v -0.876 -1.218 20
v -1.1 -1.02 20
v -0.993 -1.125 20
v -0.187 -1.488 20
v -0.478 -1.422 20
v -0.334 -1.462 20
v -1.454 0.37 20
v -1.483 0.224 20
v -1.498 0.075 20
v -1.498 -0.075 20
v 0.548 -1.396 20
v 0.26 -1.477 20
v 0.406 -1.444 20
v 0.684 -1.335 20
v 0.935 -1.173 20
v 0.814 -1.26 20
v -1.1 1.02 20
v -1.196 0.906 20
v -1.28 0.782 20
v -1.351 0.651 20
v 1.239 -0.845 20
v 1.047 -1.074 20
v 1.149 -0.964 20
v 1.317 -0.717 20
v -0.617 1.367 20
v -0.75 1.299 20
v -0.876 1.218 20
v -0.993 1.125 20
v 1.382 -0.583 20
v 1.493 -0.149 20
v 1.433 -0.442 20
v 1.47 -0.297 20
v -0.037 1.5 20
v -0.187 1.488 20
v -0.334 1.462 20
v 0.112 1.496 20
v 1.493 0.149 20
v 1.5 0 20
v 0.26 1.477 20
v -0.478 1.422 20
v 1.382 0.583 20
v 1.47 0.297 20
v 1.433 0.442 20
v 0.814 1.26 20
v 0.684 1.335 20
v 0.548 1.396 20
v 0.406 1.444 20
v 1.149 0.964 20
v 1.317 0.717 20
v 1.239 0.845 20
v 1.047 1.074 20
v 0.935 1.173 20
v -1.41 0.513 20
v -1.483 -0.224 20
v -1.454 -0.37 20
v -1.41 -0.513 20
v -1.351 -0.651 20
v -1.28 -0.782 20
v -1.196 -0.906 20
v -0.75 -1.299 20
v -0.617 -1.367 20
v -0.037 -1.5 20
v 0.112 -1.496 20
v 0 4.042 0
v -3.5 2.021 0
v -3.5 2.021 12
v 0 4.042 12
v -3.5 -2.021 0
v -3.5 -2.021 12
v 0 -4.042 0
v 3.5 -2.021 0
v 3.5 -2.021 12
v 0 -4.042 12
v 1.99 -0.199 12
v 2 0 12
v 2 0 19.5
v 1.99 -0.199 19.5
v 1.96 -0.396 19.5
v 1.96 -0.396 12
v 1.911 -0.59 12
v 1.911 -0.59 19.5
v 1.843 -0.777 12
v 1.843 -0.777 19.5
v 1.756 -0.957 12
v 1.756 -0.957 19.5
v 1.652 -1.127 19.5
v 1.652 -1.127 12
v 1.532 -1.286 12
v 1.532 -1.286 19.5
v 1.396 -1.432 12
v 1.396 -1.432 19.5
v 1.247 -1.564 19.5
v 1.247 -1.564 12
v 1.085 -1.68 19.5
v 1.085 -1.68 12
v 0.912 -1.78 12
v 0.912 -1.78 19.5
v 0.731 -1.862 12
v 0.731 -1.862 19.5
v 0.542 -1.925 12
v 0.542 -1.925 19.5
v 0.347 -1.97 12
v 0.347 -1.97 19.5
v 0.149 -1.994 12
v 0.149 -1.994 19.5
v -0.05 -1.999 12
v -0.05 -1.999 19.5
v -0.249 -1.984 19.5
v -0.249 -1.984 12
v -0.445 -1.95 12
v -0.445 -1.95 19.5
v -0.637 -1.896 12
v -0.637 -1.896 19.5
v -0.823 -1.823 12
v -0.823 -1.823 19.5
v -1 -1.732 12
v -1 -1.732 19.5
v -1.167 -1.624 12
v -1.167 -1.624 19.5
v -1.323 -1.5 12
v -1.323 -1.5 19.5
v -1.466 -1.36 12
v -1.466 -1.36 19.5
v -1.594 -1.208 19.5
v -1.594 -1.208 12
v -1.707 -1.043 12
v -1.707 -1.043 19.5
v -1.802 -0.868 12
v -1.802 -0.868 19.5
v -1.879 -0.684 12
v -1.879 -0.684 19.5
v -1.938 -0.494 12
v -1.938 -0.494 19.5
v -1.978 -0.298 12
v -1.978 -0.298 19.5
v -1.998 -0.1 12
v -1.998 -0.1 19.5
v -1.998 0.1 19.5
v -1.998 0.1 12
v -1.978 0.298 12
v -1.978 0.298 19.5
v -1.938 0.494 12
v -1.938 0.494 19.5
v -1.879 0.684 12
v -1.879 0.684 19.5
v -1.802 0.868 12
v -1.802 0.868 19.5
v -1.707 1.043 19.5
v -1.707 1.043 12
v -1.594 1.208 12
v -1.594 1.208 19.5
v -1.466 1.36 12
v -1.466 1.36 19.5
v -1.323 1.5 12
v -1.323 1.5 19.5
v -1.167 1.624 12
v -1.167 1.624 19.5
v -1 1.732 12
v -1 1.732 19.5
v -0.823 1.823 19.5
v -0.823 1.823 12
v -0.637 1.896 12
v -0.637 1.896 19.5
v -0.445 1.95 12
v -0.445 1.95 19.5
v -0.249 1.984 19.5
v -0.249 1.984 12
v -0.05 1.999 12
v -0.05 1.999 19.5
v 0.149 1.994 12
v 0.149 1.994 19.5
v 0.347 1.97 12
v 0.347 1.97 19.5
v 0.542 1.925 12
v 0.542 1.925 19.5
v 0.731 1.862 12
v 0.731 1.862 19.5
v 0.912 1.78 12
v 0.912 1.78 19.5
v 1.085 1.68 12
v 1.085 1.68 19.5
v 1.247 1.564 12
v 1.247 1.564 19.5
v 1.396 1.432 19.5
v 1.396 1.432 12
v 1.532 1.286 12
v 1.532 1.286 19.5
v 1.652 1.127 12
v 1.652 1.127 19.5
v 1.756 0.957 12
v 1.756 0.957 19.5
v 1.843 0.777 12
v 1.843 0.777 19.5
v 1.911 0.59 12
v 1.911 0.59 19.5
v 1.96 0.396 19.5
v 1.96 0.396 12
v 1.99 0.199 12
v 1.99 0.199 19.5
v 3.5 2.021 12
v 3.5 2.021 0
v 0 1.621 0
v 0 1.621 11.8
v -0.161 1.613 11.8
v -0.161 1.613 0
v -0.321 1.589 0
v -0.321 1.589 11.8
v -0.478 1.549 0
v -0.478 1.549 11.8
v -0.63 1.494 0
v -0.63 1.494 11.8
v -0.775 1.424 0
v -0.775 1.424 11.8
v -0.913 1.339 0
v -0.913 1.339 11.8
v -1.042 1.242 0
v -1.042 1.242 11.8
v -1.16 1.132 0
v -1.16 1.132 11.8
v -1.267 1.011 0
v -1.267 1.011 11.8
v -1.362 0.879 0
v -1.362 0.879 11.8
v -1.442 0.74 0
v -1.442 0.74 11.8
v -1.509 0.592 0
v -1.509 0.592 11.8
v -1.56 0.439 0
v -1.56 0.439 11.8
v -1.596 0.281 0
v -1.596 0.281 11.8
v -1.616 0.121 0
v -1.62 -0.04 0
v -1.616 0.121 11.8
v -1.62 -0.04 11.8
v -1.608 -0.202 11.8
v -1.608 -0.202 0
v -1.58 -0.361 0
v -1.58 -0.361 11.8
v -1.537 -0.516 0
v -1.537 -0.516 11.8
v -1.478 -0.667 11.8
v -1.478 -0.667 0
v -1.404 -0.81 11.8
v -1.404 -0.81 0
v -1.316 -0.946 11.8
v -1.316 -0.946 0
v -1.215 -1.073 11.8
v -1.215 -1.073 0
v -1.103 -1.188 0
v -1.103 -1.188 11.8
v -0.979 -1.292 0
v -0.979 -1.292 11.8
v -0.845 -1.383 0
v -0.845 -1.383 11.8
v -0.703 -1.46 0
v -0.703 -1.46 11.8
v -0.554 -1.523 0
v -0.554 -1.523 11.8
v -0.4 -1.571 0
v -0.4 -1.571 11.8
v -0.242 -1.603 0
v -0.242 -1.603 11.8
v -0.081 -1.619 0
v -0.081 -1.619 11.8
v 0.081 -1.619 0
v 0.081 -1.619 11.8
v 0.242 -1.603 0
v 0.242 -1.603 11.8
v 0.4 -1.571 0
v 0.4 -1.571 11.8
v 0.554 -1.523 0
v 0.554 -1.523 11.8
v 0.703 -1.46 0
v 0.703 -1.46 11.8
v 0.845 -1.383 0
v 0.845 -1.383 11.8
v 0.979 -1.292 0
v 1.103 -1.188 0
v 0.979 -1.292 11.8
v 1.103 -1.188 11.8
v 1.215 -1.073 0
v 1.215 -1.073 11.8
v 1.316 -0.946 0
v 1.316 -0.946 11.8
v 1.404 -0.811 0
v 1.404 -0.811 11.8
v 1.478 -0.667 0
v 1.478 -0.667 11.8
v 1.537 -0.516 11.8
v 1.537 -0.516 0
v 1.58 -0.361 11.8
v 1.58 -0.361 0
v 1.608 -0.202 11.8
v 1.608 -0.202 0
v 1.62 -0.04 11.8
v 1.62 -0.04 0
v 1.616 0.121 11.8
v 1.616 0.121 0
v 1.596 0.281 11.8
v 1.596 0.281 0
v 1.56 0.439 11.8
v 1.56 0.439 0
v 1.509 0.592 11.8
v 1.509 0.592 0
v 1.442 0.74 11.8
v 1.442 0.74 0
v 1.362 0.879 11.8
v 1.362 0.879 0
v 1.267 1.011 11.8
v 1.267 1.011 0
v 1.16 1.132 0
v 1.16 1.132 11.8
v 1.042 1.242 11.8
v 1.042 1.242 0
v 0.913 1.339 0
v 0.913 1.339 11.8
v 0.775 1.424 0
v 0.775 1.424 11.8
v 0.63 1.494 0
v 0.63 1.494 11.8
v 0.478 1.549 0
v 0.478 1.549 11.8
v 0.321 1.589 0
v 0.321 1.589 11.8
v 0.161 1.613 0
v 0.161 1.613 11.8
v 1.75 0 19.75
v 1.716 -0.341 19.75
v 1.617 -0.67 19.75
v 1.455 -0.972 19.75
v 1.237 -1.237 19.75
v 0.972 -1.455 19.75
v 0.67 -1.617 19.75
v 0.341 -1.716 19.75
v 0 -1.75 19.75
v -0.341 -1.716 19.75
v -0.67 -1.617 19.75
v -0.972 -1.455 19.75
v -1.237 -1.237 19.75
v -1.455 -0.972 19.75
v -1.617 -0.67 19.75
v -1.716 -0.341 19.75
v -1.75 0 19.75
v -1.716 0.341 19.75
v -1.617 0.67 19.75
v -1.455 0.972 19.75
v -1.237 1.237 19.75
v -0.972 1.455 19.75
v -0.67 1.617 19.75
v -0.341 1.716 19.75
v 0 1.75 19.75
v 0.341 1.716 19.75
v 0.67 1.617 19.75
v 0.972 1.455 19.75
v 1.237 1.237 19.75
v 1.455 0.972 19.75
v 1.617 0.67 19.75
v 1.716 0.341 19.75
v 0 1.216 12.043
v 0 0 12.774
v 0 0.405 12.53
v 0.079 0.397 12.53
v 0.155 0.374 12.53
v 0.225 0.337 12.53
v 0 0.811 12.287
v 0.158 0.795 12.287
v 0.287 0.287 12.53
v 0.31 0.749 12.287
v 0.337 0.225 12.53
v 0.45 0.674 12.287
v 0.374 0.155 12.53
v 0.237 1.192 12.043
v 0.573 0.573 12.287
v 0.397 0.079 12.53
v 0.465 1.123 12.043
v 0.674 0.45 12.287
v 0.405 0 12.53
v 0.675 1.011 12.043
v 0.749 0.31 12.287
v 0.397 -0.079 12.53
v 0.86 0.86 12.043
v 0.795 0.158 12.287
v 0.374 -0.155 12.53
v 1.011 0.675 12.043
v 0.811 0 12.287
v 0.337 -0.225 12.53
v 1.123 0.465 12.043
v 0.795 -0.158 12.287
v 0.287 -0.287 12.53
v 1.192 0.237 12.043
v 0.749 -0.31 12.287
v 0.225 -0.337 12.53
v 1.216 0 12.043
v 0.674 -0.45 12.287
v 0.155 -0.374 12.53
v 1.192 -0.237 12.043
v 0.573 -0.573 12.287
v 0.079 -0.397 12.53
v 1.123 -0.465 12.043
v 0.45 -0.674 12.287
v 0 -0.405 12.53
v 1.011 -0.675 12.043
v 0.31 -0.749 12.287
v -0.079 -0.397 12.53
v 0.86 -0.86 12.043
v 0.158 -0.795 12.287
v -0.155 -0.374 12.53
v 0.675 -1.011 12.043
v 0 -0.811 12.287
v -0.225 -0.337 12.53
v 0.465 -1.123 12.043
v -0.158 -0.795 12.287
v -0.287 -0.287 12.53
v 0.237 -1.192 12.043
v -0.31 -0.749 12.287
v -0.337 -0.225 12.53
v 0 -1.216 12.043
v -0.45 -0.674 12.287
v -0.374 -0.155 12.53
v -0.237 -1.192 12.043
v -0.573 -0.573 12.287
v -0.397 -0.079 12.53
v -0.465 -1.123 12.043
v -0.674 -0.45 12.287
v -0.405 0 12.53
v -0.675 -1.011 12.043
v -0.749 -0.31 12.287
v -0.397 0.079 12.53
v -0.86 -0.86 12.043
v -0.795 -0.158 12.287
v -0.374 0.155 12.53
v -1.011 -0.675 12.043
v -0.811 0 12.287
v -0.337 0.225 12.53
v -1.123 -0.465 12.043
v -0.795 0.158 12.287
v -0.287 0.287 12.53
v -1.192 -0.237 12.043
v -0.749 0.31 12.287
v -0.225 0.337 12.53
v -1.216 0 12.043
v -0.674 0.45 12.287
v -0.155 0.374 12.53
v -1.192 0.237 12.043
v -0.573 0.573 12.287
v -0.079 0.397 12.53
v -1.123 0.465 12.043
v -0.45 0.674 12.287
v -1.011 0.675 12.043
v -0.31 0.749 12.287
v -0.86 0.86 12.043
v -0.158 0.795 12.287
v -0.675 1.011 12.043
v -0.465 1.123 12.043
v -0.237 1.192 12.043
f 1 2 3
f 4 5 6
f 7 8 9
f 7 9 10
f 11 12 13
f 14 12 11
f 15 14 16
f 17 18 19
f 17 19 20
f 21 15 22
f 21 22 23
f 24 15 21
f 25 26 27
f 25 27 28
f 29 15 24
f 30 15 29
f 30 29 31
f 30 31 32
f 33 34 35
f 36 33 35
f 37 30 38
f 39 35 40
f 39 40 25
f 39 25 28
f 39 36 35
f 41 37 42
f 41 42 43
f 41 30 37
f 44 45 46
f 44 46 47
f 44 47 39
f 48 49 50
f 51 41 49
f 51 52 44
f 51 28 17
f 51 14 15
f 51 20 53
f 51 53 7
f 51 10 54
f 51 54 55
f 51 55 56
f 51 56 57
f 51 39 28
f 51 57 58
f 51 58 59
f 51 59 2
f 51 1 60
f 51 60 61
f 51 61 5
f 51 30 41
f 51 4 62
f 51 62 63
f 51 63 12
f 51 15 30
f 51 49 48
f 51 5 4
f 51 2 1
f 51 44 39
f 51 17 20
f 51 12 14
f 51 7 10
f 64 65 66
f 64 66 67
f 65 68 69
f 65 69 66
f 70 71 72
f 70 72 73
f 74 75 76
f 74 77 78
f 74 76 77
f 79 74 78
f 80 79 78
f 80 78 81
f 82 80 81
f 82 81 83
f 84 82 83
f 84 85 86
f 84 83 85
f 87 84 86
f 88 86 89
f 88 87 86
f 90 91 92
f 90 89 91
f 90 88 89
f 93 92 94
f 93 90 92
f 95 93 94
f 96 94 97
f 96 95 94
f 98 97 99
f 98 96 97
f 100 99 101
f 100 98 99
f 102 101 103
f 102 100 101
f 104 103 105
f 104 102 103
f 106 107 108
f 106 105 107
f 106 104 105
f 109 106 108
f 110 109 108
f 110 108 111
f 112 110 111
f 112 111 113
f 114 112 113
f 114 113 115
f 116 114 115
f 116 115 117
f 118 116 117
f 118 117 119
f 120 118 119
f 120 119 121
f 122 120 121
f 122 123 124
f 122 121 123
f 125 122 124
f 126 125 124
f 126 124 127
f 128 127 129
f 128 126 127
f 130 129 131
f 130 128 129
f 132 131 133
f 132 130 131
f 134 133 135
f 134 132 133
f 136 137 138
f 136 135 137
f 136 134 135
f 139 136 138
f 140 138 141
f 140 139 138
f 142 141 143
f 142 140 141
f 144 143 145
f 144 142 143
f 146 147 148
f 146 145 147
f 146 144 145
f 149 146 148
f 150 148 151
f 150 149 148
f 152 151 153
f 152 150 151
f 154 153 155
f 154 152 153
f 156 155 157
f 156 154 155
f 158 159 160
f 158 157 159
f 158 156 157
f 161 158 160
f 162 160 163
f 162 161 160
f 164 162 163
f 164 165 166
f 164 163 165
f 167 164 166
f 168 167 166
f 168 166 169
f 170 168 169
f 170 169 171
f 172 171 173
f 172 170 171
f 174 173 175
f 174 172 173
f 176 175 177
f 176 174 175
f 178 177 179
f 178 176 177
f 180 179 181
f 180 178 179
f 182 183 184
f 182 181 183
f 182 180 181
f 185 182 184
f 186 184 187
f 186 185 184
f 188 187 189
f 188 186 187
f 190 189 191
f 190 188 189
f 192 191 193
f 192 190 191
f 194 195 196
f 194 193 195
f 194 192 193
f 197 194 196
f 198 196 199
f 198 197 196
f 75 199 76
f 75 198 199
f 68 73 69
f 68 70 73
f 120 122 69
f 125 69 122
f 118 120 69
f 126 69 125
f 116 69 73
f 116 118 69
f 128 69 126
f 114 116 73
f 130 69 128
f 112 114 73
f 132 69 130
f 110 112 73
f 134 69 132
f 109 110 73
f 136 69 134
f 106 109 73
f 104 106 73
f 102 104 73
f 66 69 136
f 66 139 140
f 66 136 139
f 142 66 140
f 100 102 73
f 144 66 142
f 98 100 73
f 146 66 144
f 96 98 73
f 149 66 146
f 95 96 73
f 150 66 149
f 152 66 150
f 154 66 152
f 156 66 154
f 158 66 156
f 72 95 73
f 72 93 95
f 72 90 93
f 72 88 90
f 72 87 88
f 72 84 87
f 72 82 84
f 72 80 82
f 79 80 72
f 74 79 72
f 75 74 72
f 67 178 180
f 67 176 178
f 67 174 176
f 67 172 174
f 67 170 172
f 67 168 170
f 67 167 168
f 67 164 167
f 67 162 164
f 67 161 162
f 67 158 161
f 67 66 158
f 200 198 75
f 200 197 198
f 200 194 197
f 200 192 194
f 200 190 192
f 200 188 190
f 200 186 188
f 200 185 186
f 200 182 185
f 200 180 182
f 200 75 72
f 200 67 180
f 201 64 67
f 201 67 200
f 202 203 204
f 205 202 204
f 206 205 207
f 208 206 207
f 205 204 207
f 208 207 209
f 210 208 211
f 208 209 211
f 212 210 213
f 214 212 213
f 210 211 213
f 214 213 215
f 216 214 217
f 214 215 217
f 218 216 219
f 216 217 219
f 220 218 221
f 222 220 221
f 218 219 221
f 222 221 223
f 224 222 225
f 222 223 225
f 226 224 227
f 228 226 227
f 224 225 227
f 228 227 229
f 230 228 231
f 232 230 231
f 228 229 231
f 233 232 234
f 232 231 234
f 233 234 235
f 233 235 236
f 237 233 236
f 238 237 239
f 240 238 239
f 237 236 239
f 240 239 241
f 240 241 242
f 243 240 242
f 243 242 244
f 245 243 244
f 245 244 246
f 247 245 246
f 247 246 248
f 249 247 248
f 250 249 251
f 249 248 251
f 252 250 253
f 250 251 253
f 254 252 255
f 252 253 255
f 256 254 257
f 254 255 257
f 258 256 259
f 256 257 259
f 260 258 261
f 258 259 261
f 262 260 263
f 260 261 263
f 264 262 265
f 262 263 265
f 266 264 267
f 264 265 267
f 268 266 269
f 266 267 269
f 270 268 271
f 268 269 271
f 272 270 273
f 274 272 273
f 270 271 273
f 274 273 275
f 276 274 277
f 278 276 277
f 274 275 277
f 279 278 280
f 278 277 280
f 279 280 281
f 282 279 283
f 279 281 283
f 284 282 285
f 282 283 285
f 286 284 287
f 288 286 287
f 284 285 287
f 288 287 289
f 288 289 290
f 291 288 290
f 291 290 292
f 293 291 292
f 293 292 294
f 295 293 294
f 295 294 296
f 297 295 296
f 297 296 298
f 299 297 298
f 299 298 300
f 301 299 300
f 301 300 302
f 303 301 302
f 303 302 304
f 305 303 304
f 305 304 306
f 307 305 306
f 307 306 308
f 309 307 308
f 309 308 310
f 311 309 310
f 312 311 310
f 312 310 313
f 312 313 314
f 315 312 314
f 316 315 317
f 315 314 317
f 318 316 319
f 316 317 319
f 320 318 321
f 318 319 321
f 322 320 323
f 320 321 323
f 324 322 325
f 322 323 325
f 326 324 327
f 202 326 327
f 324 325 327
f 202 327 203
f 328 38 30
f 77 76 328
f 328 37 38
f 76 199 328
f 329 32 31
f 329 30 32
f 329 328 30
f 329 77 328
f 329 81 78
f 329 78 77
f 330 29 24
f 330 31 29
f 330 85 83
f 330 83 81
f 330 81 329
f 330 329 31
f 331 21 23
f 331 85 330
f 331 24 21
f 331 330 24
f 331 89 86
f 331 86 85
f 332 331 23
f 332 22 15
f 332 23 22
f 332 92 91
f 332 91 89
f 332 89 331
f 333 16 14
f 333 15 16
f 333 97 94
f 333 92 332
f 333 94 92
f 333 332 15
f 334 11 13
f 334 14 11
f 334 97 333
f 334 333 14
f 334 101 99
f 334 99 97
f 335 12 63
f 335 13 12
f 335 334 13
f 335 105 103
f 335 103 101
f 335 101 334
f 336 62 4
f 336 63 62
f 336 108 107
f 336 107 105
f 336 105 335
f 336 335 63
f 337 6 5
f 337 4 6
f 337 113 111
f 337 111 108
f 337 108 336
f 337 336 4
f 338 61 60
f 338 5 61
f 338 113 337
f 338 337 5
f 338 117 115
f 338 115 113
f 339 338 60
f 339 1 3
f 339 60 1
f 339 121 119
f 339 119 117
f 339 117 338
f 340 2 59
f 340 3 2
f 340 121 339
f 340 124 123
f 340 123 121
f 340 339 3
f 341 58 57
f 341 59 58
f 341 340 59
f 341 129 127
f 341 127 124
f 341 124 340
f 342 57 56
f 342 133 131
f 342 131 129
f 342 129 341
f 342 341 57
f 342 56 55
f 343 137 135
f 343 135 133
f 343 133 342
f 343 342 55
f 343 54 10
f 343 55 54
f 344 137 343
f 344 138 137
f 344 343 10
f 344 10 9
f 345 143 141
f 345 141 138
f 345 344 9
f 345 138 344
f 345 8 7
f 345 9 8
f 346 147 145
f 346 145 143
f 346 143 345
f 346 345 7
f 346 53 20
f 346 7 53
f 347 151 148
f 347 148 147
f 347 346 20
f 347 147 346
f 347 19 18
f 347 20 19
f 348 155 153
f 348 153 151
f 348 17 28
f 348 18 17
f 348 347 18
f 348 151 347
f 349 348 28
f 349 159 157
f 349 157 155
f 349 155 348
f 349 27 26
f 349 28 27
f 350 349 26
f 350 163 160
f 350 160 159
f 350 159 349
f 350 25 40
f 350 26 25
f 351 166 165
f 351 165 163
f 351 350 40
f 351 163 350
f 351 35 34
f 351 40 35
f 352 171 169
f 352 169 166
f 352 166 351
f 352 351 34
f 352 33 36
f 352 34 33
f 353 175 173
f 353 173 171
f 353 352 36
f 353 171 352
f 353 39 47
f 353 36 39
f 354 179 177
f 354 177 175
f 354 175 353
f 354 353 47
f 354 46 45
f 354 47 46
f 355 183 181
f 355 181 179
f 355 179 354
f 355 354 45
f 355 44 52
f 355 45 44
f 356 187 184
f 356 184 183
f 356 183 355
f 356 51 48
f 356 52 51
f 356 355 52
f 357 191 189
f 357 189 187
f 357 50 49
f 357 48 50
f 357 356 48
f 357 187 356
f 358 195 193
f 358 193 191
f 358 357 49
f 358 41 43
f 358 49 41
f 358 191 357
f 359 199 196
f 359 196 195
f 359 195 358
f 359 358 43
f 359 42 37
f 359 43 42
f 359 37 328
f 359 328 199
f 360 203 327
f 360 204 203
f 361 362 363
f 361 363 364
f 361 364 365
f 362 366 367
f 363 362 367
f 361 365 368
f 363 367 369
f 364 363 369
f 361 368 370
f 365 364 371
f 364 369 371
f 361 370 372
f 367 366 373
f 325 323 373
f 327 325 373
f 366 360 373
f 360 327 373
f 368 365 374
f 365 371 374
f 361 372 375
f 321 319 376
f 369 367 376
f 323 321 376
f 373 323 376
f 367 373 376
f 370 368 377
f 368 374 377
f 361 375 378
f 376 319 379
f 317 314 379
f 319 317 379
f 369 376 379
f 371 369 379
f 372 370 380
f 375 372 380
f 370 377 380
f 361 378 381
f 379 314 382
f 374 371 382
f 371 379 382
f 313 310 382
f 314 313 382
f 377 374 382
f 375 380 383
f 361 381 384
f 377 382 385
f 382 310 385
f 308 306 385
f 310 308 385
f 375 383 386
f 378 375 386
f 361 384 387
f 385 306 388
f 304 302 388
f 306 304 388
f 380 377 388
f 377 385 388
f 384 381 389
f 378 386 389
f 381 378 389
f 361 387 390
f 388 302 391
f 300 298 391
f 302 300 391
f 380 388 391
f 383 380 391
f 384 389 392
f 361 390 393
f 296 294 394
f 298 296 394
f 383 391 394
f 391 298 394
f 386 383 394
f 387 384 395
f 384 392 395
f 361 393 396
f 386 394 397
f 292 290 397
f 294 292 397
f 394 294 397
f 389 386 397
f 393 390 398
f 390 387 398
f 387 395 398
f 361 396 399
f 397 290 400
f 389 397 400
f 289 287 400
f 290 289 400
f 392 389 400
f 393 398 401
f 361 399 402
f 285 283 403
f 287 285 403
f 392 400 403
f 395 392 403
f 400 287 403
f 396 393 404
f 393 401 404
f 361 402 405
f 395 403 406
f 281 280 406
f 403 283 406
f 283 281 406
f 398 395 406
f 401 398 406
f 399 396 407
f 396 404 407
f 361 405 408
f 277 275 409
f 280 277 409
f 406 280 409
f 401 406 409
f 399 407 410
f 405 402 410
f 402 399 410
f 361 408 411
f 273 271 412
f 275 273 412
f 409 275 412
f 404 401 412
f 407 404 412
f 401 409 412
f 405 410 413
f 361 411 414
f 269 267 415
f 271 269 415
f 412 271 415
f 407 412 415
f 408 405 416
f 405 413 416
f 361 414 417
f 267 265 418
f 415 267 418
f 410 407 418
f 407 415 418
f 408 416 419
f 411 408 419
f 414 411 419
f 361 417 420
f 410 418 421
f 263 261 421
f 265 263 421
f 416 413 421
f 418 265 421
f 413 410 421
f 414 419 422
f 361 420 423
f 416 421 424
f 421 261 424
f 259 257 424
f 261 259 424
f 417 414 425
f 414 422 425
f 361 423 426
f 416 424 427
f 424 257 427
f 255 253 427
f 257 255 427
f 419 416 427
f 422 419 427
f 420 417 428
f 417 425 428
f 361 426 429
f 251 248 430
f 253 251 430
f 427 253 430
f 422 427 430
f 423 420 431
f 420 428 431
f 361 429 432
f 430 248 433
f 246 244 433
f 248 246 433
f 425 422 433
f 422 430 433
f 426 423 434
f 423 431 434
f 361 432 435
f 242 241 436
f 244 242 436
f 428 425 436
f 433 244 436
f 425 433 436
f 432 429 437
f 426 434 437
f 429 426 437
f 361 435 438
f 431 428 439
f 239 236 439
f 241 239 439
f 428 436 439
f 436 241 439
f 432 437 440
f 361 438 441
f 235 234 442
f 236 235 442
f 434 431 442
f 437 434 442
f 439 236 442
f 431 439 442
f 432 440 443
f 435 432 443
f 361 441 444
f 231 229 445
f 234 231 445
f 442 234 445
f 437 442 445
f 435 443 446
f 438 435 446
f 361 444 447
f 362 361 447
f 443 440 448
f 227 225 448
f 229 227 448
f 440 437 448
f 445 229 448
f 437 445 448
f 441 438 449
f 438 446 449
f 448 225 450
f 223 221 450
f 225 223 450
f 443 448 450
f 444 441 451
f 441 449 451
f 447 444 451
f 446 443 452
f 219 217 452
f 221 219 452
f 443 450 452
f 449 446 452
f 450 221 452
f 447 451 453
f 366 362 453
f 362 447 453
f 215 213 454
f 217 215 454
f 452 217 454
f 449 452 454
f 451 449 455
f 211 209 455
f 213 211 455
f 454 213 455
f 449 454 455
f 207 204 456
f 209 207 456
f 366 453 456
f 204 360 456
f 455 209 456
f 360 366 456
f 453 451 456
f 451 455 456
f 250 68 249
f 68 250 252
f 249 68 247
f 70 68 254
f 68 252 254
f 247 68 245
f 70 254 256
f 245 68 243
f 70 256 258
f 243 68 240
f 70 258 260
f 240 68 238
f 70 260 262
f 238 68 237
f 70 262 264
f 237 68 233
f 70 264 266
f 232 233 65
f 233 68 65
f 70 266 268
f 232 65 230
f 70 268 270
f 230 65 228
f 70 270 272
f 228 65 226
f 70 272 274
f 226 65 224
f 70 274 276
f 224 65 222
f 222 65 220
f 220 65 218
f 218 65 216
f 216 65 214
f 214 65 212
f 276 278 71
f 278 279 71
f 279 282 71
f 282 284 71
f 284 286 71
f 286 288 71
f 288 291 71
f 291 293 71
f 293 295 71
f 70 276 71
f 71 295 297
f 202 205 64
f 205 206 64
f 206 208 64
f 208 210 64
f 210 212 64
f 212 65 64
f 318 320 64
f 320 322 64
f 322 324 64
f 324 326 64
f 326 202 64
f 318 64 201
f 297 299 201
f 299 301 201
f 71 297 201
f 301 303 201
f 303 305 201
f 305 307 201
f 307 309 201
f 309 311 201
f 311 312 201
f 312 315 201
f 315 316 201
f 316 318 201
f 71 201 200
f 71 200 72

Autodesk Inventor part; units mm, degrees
ref_plane "YZ Plane" through (0, 0, 0) normal (1, 0, 0) x (0, 1, 0)
ref_plane "XZ Plane" through (0, 0, 0) normal (0, 1, 0) x (-1, 0, 0)
ref_plane "XY Plane" through (0, 0, 0) normal (0, 0, 1) x (1, 0, 0)
sketch "Sketch1" plane through (0, 0, 0) normal (0, 0, 1) x (1, 0, 0)
  line L0 (3.5, 2.0207) -> (3.5, -2.0207)
  line L1 (3.5, -2.0207) -> (0, -4.0415)
  line L2 (0, -4.0415) -> (-3.5, -2.0207)
  line L3 (-3.5, -2.0207) -> (-3.5, 2.0207)
  line L4 (-3.5, 2.0207) -> (0, 4.0415)
  line L5 (0, 4.0415) -> (3.5, 2.0207)
  point P0 (0, 0)
  point P1 (0, 0)
  dimension "d0" = 7
extrude "Extrusion1" add sketch "Sketch1" along normal blind 12
sketch "Sketch2" plane through (0, 0, 12) normal (0, 0, 1) x (1, 0, 0)
  circle A0 centre (0, 0) radius 2
  dimension "d3" = 4
extrude "Extrusion2" add sketch "Sketch2" along normal blind 8
sketch "Sketch3" plane through (0, 0, 0) normal (0, 0, -1) x (-1, 0, 0)
  point P0 (0, 0)
  point P1 (0, 0)
hole "Hole1" at (0, 0, 0) direction (0, 0, 1) diameter 3.242 depth 11.8 tip angle 118 thread size "M4x0.7" class "6H" standard "ISO Metric profile"
chamfer "Chamfer1" distance 0.5 angle 45 1 edges at (-2, 0, 20)
thread "Thread1" size "M4x0.7" class "6g" standard "ANSI Metric M Profile" full length
properties part number "Abstandshalter_10mm_M4" material "Stainless Steel"
